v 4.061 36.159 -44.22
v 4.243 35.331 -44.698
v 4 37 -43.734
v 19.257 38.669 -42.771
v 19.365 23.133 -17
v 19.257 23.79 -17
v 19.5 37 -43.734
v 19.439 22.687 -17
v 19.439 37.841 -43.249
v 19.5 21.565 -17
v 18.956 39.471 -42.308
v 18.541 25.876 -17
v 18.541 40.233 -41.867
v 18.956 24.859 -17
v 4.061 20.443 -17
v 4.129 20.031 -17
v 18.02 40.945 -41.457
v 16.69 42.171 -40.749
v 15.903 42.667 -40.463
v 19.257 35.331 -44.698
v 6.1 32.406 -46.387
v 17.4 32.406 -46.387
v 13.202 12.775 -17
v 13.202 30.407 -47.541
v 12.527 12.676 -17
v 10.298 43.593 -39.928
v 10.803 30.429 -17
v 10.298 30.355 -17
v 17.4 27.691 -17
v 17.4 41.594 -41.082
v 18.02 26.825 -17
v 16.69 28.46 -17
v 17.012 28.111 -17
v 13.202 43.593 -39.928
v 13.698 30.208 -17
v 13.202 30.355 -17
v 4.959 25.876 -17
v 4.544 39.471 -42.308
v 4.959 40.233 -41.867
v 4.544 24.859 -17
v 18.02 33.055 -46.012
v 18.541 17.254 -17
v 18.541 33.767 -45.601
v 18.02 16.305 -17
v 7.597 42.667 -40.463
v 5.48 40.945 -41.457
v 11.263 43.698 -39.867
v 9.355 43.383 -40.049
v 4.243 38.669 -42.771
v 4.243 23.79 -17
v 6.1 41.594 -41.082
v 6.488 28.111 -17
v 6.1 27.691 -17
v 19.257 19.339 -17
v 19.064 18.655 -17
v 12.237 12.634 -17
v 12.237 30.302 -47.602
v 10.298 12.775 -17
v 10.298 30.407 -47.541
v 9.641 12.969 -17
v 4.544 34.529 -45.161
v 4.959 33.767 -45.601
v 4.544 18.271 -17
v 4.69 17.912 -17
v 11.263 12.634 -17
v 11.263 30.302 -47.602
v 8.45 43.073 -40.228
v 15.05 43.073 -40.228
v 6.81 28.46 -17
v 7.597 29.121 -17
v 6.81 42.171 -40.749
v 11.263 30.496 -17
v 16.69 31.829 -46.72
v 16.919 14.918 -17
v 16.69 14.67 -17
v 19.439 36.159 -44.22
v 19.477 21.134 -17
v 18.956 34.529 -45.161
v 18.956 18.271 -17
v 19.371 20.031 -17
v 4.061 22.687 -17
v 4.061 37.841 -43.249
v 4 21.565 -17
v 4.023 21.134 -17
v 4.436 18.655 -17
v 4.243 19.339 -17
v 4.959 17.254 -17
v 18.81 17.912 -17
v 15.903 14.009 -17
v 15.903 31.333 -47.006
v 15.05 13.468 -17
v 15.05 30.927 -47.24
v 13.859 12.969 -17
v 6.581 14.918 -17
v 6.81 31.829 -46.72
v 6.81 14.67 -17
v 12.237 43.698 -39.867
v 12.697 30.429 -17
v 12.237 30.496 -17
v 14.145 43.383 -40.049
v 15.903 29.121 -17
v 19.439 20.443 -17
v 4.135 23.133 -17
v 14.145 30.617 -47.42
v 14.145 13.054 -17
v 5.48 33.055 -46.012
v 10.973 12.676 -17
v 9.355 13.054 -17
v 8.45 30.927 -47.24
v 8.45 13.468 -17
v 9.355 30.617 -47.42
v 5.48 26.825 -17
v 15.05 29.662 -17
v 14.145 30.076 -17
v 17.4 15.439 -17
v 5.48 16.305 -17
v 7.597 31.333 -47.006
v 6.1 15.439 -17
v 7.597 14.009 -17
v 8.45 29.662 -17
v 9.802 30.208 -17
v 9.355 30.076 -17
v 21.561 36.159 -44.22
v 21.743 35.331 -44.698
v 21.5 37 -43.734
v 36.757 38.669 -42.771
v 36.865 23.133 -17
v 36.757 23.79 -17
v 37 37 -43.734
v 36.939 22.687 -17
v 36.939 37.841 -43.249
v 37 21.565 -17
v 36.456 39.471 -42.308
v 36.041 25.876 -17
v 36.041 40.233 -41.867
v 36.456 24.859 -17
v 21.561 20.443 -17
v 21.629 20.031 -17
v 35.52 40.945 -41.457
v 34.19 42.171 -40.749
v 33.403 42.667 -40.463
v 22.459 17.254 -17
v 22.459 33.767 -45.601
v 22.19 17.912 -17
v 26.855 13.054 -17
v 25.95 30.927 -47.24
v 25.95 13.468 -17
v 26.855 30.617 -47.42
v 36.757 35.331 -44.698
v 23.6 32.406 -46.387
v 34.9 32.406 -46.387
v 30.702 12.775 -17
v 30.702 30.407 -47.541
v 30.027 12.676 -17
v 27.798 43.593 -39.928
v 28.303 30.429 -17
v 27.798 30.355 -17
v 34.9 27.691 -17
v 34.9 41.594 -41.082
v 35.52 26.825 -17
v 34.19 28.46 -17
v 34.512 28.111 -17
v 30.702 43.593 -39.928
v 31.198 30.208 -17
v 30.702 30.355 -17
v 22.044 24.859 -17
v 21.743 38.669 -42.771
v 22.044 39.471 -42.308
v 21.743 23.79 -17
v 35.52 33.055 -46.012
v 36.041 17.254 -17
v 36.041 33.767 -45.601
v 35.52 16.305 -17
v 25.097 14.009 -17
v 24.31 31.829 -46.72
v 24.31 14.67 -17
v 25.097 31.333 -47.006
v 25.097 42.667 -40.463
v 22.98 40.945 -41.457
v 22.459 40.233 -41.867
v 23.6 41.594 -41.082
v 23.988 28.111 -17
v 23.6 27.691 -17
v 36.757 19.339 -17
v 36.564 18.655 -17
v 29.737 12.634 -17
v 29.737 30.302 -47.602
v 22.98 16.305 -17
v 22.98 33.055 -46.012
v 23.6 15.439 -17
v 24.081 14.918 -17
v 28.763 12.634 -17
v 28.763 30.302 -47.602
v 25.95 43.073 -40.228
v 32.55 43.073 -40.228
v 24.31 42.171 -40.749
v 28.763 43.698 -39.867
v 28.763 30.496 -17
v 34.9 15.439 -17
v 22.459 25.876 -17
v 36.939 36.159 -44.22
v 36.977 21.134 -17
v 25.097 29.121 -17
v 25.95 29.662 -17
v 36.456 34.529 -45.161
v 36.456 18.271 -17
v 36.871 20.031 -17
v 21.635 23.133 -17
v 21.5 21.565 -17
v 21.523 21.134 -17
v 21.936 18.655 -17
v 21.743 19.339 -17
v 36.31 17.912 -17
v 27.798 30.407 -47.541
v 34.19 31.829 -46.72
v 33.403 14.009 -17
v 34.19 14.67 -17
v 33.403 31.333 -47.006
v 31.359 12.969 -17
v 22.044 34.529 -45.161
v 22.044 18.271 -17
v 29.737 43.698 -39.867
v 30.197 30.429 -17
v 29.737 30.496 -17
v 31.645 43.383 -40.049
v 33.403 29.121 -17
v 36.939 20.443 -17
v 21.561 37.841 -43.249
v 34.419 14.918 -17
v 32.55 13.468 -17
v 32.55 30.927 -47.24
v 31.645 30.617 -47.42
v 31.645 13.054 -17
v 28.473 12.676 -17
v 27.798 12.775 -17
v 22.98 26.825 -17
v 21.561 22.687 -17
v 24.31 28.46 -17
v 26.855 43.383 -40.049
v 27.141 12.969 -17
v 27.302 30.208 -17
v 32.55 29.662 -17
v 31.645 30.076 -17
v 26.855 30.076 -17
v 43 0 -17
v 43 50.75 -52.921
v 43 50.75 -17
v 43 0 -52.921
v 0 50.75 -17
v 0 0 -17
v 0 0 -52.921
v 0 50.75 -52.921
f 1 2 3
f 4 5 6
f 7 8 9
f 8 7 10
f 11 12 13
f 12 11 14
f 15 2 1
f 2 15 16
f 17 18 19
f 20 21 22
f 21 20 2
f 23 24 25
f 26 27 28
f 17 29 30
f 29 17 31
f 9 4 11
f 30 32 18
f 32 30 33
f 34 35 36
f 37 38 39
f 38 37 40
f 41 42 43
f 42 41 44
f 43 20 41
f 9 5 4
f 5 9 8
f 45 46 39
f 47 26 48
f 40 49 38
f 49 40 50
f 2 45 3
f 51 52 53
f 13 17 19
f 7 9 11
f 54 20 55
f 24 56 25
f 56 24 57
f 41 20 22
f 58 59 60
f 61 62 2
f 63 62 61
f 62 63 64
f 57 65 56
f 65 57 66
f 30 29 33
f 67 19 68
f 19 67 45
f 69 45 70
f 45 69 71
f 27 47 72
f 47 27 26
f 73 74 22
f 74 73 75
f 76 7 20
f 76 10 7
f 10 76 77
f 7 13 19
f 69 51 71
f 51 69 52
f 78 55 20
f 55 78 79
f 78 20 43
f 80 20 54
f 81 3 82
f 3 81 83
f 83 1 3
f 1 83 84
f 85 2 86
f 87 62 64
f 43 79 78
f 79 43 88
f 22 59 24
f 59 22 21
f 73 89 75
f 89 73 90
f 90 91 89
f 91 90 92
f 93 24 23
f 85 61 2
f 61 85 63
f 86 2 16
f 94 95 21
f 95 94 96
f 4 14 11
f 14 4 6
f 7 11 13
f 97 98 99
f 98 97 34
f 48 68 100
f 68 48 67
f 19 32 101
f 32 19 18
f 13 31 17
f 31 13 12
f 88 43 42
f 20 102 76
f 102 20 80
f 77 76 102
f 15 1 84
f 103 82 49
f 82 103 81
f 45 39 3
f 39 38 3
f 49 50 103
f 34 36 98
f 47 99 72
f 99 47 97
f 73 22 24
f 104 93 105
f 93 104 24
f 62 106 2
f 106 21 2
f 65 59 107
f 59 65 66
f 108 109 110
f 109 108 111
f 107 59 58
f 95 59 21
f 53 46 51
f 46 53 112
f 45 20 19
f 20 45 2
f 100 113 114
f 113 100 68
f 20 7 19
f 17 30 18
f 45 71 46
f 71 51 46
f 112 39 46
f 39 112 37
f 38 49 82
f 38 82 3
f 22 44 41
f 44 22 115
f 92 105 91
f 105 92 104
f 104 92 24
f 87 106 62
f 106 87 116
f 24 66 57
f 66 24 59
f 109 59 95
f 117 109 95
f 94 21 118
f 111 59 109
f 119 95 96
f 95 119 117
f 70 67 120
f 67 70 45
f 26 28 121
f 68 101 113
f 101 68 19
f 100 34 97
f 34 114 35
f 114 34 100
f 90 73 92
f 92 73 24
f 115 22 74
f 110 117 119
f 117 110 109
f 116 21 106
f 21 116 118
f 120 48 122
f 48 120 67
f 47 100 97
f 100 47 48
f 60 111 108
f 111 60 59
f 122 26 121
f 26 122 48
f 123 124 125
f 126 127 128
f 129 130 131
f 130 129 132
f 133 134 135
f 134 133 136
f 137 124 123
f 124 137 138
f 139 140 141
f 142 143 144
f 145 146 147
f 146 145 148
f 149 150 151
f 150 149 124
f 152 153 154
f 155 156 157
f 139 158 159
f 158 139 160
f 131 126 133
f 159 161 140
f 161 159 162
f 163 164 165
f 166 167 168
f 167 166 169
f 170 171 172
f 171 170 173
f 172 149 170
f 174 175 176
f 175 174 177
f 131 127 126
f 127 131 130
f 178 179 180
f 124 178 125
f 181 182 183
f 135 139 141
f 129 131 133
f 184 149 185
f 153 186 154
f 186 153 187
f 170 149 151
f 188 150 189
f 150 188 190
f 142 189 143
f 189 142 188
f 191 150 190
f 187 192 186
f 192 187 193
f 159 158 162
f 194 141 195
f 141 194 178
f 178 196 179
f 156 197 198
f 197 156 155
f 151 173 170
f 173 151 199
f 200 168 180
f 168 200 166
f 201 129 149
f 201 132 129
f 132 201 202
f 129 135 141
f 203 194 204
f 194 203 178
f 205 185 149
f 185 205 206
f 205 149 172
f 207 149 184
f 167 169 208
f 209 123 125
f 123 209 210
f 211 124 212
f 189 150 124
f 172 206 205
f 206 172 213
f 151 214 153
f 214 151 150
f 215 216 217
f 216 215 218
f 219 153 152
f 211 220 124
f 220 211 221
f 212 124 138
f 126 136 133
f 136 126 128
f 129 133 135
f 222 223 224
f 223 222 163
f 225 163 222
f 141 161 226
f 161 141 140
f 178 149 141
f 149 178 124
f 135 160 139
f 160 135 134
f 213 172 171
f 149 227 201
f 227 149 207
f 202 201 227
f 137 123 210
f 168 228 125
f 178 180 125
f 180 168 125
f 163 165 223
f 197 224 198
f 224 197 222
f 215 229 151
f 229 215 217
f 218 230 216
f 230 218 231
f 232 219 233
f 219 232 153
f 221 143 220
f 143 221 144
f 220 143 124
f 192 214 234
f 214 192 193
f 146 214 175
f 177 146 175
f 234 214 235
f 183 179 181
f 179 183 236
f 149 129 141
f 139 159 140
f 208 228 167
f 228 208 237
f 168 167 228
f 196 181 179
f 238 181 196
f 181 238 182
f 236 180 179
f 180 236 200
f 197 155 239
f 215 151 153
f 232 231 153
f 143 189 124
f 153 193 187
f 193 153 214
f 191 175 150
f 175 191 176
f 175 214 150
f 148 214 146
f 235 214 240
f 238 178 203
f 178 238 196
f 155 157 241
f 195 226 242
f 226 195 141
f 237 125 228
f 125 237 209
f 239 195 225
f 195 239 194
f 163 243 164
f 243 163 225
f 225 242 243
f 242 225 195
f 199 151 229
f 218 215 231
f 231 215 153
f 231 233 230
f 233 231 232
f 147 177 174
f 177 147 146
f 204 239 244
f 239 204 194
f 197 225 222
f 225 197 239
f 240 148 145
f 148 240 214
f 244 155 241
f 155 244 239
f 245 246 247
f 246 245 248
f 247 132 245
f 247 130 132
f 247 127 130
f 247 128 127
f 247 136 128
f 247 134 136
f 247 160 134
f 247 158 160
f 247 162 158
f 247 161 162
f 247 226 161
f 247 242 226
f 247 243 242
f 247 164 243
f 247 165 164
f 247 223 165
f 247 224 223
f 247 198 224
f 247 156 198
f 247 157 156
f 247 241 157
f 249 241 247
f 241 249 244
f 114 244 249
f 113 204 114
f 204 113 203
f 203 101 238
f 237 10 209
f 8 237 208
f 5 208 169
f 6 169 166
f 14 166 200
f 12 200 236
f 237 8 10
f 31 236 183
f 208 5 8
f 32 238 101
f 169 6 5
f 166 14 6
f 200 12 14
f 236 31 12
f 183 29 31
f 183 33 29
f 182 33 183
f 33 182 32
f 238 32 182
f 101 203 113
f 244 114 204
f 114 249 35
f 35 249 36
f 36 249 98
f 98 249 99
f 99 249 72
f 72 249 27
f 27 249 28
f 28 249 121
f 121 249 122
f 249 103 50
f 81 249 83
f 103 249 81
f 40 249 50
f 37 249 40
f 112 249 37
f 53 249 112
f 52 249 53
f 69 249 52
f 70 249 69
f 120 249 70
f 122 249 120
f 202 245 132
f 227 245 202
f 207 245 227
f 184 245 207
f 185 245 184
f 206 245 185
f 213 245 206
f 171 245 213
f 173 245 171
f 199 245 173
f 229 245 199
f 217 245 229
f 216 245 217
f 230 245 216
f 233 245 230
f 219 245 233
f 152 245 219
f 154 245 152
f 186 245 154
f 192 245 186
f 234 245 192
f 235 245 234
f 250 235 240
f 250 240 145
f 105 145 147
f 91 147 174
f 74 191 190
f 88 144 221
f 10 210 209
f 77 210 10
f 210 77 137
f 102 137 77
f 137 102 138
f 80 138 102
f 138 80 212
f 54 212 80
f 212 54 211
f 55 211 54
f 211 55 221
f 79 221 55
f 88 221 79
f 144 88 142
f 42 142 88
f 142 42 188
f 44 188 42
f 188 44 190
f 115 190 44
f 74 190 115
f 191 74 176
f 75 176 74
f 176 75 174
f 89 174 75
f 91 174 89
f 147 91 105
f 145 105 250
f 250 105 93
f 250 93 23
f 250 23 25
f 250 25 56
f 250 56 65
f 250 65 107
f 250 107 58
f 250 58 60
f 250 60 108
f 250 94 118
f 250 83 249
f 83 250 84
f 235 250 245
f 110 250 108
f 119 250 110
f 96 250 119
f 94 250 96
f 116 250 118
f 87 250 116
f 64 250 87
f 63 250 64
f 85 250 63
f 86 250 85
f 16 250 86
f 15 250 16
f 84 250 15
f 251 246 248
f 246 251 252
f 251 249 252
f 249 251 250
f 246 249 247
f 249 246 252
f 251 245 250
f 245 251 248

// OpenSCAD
/* not used... but interesting
https://math.stackexchange.com/questions/2845543/z-intersection-of-cylinder-and-plane-base-on-angle-around-cylinder
*/

// pick one from below
BATTERY_TYPE = "AA"; // [ AAAA, AAA, AA, A, B, C, Sub-C, D, F, N, A23, A27, BA5800, 4SR44 ]


NUM_ACROSS = 2;
NUM_DOWN = 1;
BATTERY_TILT = 30;
XRAY_ENABLED = false;


/* [Hidden] */
$fn=50;
DIAMETER_TWEAK_mm=1; // spec says 1mm deviation.

BATTERY_DIMENSIONS = [
["AAAA",    [8.3 ,  42.5]],
["AAA",     [10.5 , 44.5]],
["AA",      [14.5 , 50.5]],
["A",       [17 ,   50]],
["B",       [21.5 , 60]],
["C",       [26.2 , 50]],
["Sub-C",   [22.2 , 42.9]],
["D",       [34.2 , 61.5]],
["F",       [33 ,   91]],
["N",       [12 ,   30.2]],
["A23",     [10.3 , 28.5]],
["A27",     [8.0 ,  28.2]],
["BA5800",  [35.5 , 128.5]],
["4SR44",   [13 ,   25.2]]
];

SPACE_BETWEEN_BATTERIES = 2;
AWAY_FROM_WALL = SPACE_BETWEEN_BATTERIES * 2;

XRAY_ON = XRAY_ENABLED ?  1 : 0;

// a circle on an angle is an elipse. This will determine where the circle first
// touches the plane compared to where a vertical cyclinder whould touch the plane.
function ELIPTICAL_DIA (DIA) =   DIA  / cos(BATTERY_TILT);

//-------------------------------------------------------------------------
//https://en.wikibooks.org/wiki/OpenSCAD_User_Manual/Other_Language_Features#Index_values_return_as_list

// modules vs function
// modules cannot return values.
// modules may have multiple lines
// functions cannot have multiple lines
// functions have an "=" instead of "{}" like modules do
// functions are "one liners"
// test function behaviour by writing a module first.

// search for name in BATTERY_DIMENSIONS, name will be found in field 0 ",0"
// return the pair found '[0][0]'
// only interested in [1], (the right hand side of a pair)

module testSearchTable( name)
{
    // search(name) will FAIL !!!!!, it will take name, and search for each LETTER in name. UGH
    
    // use "search([name]  search(name)
    
    // search[name] treats name as a string  and searches for WORD 'name'
    
    echo (BATTERY_DIMENSIONS[search([name], BATTERY_DIMENSIONS,0)[0][0]]);
    foo = (BATTERY_DIMENSIONS[search([name], BATTERY_DIMENSIONS,0)[0][0]]);
    echo ("testSearchTable =",foo);
}
//-------------------------------------------------------------------------

function getBatteryDimensions( name) = 
    (BATTERY_DIMENSIONS[search([name], BATTERY_DIMENSIONS,0)[0][0]])[1];
    
//==========================================================

module makeAbattery( name )
{
    data = getBatteryDimensions(name);
    batteryLength = data[1];
    batteryDiameter = data[0];
    
    echo();
    echo("makeAbattery ", name, "batteryLength =", batteryLength, "batteryDiameter =", batteryDiameter);
    testSearchTable(name);
    
    translate ( [ 0, 0, -batteryLength])
    {
        color("RED")
        cylinder(d = batteryDiameter + DIAMETER_TWEAK_mm, h = batteryLength);
        
    }
}
//==========================================================

module makeBank( type)
{

    echo ("search in table ", getBatteryDimensions(type));
    DIAMETER = getBatteryDimensions(type)[0] + DIAMETER_TWEAK_mm;
    
    translate([AWAY_FROM_WALL + DIAMETER/2, AWAY_FROM_WALL + DIAMETER/2, 0]) 

    for (down = [ 0 : NUM_DOWN -1])
    {
        y = down * ELIPTICAL_DIA(DIAMETER + SPACE_BETWEEN_BATTERIES);
        
        translate([0, y, 0])
        for (across = [ 0 : NUM_ACROSS - 1 ])
        {
            x = across * (DIAMETER + SPACE_BETWEEN_BATTERIES) ;

            translate ( [ x, 0, 0 ])
            rotate([ BATTERY_TILT, 0, 0 ])
            makeAbattery(type);
        }
        
    }

    //echo (">>>>>>>>>>>>>>>>  DIA = ", DIAMETER, " ELIPTICAL_DIA = ", ELIPTICAL_DIA(DIAMETER));
    
}
//==========================================================

difference()
{

    BAT_DIA = getBatteryDimensions(BATTERY_TYPE)[0] ;
    BAT_LEN = getBatteryDimensions(BATTERY_TYPE)[1];
        Xbox =  (2 - XRAY_ON) * AWAY_FROM_WALL  + (NUM_ACROSS - XRAY_ON * .5) * (BAT_DIA + DIAMETER_TWEAK_mm +  SPACE_BETWEEN_BATTERIES );
    
    Ybox =  2 * AWAY_FROM_WALL + (NUM_DOWN) * (BAT_DIA + SPACE_BETWEEN_BATTERIES + DIAMETER_TWEAK_mm ) + BAT_LEN * sin(BATTERY_TILT) ;
    
    echo ("X box = ", Xbox);
    echo ("Y box = ", Ybox);
    
    BOX_DEPTH = BAT_LEN * 1.05 * cos(BATTERY_TILT);
    
    translate ([ 0, 0, -BOX_DEPTH -7])
    color("GREEN", .3)
    cube( [ Xbox, Ybox , BOX_DEPTH-10]);

    makeBank(BATTERY_TYPE);
}
